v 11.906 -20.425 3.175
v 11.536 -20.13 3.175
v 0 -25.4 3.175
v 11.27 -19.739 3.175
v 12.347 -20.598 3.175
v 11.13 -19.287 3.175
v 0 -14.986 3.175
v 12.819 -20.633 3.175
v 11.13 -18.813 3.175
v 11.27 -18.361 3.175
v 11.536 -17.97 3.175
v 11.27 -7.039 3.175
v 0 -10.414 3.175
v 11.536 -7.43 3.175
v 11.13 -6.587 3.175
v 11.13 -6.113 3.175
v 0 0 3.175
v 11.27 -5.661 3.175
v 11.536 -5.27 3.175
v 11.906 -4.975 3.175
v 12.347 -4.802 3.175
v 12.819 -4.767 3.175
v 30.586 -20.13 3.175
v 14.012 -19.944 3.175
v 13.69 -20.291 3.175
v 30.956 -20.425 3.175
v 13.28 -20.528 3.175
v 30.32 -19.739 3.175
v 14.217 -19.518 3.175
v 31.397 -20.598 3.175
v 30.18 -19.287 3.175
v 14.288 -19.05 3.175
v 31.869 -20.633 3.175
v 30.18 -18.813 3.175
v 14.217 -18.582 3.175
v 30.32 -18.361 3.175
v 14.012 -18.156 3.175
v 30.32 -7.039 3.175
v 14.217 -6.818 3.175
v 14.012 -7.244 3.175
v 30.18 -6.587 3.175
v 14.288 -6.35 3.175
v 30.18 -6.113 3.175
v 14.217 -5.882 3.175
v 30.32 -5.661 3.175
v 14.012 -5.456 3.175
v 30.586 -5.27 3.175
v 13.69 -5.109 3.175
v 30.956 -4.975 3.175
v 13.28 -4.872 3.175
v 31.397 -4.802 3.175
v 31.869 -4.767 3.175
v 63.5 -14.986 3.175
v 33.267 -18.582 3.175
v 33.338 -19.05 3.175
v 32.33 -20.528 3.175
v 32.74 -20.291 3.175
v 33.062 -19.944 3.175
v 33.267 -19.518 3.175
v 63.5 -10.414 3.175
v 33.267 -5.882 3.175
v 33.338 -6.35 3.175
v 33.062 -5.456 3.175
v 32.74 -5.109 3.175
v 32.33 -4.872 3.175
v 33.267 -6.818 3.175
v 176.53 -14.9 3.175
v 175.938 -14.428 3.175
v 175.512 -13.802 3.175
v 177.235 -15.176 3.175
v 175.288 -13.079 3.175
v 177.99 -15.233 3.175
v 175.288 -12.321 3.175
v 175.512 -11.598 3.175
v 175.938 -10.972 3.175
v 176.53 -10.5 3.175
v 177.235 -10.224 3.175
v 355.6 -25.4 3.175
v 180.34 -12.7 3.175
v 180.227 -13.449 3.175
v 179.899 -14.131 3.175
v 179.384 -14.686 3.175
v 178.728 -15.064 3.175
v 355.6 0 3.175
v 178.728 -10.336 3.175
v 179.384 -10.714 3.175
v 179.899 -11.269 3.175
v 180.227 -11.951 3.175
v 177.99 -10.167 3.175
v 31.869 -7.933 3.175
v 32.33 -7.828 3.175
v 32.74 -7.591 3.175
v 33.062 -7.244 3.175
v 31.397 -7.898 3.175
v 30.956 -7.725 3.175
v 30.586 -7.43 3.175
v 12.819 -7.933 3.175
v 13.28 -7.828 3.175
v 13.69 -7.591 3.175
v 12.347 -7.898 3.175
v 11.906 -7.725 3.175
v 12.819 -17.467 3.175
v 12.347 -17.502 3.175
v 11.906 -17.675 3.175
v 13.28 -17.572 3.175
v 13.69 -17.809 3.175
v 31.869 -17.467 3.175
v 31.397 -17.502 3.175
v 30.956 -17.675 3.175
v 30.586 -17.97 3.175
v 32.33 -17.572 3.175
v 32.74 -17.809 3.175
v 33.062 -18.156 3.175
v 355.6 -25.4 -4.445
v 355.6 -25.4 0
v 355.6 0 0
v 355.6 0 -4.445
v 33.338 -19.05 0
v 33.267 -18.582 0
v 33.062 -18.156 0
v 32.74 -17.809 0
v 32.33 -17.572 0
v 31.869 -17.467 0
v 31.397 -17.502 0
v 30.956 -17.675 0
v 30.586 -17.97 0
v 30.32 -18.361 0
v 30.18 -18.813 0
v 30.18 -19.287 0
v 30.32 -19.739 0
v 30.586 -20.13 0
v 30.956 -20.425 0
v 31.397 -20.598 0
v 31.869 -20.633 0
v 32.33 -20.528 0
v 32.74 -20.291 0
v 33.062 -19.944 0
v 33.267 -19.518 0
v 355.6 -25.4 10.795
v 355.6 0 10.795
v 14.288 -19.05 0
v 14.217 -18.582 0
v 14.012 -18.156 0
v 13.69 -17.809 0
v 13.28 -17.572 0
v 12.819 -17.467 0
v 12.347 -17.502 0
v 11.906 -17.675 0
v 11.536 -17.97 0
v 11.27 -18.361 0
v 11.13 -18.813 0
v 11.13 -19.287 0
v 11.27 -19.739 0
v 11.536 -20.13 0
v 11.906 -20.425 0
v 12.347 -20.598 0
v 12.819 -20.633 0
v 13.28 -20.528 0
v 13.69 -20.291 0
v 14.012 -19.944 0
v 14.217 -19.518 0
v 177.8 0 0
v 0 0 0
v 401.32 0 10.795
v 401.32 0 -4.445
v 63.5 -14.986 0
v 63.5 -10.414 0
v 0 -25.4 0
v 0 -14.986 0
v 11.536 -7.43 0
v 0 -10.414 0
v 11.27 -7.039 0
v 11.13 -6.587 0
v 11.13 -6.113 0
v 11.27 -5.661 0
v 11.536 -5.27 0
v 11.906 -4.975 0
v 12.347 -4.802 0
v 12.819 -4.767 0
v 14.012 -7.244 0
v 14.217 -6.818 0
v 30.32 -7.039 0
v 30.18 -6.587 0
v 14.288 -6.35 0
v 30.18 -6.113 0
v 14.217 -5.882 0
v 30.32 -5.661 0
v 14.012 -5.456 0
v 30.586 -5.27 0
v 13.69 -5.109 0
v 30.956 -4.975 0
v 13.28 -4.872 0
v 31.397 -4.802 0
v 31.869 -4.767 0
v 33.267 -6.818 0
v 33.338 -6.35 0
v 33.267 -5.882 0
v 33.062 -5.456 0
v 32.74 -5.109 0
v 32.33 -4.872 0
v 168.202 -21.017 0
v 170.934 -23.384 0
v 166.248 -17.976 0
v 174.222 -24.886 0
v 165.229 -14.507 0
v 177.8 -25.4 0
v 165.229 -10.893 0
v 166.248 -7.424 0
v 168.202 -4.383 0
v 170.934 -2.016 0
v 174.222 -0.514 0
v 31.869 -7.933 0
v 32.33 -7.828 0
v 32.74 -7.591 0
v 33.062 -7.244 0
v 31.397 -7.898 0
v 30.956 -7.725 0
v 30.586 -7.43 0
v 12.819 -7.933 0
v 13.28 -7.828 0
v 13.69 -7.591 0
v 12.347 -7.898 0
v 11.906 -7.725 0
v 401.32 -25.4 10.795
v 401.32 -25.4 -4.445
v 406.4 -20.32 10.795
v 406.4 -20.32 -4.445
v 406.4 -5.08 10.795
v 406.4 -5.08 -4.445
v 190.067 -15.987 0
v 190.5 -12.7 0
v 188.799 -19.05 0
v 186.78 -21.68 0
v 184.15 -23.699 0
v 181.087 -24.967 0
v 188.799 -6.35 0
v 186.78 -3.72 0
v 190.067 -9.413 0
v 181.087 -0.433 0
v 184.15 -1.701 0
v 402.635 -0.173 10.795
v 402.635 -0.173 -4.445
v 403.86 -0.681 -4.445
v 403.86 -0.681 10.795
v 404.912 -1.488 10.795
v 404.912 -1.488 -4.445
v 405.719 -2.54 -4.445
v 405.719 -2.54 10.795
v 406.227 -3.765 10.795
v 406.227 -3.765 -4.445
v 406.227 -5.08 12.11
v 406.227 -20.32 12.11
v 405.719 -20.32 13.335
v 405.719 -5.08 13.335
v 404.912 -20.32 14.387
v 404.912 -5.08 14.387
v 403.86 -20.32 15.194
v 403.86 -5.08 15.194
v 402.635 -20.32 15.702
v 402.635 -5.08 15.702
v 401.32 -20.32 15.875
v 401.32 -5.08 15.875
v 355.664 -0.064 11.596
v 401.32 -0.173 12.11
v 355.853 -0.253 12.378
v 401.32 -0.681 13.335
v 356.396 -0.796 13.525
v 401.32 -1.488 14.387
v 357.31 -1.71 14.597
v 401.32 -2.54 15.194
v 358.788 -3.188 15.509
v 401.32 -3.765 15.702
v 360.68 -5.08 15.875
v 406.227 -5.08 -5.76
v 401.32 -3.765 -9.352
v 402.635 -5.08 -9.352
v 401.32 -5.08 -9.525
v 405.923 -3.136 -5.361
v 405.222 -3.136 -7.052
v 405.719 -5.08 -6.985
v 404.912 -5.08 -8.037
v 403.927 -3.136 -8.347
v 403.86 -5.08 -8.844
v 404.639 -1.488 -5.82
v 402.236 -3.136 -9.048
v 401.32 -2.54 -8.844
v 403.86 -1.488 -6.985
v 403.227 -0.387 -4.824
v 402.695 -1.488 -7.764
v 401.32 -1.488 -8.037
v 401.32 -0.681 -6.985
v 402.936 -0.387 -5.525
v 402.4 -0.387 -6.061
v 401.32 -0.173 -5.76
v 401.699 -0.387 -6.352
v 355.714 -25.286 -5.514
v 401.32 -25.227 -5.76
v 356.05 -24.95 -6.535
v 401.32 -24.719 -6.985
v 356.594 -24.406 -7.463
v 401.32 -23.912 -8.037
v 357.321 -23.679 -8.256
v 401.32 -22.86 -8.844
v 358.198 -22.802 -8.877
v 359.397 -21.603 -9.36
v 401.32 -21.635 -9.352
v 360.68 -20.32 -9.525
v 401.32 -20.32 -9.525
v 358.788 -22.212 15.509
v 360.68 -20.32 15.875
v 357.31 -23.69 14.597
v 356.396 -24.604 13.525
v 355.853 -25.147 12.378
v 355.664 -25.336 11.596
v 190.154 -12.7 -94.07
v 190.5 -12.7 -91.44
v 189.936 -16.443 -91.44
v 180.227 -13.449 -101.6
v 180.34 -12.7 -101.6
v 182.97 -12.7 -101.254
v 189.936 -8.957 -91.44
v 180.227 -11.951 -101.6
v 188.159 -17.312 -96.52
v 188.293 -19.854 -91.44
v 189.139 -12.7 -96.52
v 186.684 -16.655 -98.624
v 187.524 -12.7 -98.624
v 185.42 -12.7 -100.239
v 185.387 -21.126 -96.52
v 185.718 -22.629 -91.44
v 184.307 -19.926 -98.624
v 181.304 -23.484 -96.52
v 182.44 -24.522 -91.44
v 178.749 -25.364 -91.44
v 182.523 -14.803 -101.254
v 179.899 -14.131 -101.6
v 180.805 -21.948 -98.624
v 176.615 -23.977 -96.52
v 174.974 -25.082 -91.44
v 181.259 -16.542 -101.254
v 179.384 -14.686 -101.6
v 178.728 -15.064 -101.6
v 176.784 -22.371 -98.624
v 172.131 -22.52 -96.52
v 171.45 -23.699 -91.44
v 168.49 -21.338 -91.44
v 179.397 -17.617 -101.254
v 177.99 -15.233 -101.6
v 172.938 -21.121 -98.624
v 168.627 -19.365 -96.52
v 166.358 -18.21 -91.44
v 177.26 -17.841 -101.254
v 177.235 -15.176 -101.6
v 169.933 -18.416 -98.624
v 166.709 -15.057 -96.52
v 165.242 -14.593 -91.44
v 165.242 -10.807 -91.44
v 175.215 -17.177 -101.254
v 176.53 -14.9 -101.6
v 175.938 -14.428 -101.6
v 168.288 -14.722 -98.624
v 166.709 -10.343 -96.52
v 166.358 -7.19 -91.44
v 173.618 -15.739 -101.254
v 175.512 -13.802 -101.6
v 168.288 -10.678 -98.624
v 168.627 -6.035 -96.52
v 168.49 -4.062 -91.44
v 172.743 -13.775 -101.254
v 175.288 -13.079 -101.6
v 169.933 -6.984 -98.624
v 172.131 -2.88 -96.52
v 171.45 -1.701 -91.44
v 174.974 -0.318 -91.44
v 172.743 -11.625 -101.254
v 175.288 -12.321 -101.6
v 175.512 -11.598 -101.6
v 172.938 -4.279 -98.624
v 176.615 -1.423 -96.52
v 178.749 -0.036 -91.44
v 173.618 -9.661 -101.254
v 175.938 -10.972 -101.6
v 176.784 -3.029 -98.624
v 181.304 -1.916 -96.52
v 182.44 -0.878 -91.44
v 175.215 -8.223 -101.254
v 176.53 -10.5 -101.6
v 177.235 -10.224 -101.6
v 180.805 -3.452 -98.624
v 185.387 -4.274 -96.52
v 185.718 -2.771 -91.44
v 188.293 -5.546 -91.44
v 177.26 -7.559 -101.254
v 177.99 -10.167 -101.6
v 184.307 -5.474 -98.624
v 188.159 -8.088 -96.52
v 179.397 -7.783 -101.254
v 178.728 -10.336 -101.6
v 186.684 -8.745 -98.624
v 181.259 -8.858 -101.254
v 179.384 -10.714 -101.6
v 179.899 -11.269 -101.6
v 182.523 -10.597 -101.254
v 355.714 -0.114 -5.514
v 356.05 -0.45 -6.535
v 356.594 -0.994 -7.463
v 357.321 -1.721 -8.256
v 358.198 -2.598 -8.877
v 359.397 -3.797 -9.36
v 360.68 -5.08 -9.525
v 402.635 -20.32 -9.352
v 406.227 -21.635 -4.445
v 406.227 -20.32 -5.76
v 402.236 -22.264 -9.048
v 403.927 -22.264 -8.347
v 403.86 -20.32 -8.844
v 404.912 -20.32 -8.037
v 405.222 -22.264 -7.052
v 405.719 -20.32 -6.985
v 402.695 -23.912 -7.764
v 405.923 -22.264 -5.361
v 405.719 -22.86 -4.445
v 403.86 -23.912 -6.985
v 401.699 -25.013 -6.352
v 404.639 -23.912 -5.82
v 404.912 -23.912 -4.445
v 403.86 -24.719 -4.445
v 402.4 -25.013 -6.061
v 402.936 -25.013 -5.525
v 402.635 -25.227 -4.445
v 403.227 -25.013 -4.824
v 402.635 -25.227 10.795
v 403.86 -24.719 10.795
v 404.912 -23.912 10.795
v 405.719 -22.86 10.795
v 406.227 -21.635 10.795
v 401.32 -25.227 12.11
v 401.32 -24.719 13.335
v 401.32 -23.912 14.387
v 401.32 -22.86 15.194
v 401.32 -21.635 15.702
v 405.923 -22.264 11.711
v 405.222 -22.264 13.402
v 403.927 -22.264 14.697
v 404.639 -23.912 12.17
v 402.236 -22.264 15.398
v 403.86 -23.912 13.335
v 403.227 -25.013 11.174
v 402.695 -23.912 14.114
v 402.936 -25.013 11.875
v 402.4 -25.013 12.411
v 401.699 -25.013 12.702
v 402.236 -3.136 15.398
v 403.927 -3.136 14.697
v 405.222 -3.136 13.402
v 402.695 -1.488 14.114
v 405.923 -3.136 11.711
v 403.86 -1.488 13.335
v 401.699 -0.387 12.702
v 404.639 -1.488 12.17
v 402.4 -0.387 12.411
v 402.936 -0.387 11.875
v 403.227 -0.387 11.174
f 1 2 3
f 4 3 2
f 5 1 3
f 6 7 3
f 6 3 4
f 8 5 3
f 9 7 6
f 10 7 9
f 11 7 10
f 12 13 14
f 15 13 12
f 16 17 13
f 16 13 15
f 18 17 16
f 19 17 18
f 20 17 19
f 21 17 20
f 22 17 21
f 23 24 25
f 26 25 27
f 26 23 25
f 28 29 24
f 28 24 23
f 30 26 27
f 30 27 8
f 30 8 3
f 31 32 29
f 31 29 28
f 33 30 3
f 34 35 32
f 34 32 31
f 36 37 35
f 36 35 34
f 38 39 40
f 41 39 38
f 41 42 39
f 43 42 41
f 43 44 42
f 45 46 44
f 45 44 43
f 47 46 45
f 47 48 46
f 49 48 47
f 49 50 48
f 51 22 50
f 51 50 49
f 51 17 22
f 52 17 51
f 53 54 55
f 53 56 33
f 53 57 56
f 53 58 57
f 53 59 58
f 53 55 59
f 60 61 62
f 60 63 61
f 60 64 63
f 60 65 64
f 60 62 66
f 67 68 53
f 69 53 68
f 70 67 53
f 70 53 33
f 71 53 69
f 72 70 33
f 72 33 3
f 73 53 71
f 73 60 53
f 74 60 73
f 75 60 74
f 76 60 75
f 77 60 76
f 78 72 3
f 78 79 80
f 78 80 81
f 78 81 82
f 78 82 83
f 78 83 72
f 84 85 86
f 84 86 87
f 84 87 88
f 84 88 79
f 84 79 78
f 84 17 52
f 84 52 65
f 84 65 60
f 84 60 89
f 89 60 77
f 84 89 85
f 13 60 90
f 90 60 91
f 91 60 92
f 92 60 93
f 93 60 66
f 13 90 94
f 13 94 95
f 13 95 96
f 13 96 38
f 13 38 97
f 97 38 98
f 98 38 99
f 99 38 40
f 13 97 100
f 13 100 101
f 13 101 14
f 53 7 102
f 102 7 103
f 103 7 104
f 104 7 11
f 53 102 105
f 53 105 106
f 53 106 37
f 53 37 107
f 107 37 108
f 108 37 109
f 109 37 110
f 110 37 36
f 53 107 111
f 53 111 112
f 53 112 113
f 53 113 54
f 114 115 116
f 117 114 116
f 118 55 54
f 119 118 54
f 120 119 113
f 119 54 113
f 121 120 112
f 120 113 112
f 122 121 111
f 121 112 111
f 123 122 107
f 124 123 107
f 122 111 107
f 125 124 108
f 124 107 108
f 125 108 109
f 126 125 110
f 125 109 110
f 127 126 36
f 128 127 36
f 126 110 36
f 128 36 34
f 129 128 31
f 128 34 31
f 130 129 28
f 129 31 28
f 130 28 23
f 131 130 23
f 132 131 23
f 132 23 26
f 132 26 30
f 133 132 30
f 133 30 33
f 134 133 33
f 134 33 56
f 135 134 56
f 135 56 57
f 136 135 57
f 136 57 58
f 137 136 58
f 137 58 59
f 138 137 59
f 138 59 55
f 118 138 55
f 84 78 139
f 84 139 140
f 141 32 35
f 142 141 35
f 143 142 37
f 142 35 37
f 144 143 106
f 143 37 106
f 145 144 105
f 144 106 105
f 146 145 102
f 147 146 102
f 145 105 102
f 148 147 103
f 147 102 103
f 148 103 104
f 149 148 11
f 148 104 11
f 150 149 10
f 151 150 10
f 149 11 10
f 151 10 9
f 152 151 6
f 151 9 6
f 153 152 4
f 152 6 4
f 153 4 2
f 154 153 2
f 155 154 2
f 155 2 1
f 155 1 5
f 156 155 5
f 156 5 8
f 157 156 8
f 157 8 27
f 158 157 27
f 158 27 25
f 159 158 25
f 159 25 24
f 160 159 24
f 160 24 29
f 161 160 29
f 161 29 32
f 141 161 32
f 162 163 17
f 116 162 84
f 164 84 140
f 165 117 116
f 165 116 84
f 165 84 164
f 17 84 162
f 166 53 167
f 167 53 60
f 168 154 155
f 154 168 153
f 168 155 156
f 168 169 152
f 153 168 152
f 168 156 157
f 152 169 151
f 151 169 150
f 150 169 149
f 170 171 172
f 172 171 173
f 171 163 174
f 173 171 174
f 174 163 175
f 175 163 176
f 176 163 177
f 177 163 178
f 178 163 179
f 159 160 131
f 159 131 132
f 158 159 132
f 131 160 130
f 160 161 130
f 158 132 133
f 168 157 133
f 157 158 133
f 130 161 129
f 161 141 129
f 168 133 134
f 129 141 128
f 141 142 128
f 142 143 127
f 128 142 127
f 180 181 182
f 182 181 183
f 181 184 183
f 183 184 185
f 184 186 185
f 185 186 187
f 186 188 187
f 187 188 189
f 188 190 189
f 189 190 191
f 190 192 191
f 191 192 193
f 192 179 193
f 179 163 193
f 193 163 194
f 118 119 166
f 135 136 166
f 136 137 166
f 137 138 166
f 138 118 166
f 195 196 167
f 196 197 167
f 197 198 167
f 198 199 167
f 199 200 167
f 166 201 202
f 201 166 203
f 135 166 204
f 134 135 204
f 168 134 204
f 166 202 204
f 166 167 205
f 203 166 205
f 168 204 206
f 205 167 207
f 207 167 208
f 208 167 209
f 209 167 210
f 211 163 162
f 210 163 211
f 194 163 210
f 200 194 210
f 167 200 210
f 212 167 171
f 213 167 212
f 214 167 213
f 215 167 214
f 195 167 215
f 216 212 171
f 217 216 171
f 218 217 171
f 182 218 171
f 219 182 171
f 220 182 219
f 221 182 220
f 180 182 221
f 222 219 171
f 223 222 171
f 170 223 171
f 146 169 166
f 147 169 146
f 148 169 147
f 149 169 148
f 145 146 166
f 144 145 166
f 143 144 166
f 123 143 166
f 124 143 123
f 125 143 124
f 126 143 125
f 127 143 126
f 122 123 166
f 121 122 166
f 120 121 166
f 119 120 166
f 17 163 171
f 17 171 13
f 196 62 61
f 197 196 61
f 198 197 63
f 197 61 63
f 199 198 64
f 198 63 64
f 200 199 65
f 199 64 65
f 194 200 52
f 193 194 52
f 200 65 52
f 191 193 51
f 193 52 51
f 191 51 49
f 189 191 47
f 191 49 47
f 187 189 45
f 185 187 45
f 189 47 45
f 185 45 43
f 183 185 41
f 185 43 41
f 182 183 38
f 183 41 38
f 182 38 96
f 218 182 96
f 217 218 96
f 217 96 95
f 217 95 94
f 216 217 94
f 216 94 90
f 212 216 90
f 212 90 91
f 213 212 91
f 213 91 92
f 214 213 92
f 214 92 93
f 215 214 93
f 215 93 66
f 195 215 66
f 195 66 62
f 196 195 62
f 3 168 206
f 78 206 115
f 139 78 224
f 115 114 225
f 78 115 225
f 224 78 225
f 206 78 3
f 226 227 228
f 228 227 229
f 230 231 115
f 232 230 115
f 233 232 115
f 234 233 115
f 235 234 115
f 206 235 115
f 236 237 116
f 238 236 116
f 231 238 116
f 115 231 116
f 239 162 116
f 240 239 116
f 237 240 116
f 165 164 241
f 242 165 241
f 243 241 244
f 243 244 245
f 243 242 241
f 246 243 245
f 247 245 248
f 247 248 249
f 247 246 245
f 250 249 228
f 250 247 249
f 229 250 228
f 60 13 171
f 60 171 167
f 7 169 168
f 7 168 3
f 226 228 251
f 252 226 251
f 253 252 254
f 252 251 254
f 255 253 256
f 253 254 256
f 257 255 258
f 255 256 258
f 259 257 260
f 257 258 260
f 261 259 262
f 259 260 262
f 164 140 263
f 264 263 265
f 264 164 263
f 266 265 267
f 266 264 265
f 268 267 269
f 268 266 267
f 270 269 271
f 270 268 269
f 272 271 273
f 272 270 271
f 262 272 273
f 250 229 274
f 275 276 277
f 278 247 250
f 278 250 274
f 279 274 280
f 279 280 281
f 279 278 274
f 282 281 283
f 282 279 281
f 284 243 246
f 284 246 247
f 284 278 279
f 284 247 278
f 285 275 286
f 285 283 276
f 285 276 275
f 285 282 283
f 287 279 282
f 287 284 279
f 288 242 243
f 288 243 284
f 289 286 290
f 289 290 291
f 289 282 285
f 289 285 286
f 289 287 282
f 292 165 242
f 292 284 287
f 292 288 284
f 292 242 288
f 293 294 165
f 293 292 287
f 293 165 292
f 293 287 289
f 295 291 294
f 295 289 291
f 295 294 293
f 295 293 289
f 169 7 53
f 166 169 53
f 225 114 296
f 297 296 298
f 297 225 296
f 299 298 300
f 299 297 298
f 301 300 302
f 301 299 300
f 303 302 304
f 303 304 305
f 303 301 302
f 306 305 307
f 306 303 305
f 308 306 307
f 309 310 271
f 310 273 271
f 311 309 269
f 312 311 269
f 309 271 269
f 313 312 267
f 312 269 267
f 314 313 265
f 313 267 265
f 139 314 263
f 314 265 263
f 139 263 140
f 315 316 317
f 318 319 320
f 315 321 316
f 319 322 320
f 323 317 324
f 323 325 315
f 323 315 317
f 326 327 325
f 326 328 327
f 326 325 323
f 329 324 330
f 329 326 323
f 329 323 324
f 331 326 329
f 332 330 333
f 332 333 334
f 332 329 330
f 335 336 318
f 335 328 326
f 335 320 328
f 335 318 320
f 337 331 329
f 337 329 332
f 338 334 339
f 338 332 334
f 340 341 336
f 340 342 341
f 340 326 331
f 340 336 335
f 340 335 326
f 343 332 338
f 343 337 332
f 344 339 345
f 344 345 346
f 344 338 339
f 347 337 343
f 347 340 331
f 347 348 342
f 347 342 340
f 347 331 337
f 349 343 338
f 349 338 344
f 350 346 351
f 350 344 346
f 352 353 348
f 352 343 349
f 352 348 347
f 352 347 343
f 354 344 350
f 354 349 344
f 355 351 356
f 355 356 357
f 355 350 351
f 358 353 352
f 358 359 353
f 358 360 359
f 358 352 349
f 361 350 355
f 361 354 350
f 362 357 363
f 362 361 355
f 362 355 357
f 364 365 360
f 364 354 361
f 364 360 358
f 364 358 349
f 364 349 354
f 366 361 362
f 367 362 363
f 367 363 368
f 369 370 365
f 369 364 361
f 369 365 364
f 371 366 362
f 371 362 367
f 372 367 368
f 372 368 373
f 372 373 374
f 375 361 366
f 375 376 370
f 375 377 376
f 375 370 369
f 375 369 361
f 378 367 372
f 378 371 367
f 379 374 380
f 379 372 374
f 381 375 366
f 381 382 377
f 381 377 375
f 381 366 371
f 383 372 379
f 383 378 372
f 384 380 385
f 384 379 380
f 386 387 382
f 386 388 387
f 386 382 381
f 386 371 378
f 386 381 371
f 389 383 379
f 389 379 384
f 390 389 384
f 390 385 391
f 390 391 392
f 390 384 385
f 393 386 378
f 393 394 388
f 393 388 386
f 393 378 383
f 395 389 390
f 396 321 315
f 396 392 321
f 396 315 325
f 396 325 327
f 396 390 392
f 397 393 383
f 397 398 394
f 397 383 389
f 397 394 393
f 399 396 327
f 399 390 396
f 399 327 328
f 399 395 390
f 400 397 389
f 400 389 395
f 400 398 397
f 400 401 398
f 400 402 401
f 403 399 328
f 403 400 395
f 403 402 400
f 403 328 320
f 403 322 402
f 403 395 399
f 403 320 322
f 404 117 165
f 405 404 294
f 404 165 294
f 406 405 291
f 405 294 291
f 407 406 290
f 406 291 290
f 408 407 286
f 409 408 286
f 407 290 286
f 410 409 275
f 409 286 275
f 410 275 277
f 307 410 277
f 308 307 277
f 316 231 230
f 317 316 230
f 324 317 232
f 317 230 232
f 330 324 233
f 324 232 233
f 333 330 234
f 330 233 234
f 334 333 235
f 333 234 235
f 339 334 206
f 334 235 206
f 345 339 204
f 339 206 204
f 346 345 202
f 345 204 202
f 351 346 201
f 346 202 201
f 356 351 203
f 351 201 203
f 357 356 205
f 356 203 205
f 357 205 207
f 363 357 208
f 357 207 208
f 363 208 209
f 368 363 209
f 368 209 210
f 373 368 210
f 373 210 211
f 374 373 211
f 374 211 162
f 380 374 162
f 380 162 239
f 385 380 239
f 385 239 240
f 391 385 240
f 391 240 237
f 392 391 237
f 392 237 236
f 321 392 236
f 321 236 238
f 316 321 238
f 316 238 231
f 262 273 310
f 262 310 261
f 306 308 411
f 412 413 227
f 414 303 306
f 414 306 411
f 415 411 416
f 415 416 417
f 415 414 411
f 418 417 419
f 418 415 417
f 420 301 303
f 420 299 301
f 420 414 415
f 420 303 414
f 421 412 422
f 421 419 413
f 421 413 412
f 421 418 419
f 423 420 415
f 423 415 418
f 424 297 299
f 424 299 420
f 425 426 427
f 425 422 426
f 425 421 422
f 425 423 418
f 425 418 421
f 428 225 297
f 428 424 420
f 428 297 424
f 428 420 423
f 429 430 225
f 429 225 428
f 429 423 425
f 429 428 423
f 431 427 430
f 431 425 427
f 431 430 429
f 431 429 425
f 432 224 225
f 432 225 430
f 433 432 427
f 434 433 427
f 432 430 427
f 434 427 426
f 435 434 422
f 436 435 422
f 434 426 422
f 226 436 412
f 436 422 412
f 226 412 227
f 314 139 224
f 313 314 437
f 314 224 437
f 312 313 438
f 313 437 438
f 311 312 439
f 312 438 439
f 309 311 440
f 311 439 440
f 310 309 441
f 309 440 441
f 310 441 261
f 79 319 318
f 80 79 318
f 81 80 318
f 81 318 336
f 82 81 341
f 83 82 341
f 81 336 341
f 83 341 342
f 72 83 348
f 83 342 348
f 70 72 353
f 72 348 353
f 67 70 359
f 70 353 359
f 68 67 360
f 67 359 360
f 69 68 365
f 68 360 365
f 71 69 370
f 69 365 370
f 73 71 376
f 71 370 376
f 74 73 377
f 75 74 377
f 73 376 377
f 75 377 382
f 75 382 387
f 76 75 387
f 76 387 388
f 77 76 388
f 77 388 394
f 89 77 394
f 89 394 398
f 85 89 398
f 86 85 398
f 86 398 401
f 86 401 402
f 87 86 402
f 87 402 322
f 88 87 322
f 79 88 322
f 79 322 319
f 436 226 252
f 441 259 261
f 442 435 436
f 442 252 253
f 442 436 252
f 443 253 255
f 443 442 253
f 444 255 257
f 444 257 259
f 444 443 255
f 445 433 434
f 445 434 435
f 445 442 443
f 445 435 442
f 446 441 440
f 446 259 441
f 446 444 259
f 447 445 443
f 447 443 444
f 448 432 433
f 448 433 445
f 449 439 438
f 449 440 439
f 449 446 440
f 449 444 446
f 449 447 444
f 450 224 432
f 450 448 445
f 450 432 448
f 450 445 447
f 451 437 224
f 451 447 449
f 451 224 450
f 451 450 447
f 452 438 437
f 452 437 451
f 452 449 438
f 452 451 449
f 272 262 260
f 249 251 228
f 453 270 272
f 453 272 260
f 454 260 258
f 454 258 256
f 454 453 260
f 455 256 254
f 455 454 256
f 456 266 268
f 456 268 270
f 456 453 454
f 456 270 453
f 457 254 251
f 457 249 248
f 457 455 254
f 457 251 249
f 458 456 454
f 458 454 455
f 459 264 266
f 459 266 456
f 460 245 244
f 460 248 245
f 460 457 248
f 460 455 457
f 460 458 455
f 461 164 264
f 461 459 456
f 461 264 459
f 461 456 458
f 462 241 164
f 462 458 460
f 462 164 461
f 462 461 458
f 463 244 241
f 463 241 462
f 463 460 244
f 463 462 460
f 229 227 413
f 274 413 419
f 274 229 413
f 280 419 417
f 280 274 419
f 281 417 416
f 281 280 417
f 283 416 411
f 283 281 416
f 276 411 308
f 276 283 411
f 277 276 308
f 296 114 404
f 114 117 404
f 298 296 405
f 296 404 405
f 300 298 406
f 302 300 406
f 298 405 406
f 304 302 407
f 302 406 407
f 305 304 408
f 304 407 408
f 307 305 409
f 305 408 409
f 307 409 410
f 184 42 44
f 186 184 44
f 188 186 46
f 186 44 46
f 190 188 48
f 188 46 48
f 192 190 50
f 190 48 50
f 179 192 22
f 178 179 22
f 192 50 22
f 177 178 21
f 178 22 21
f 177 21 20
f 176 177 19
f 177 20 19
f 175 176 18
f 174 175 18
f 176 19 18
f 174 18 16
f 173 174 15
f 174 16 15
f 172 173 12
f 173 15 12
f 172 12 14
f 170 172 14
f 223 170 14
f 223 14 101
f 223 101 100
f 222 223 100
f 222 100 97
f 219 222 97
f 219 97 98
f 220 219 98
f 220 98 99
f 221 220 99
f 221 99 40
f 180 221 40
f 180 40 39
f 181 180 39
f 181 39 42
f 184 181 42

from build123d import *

# Parameters (mm, degrees)
F0_W          = 203.2
F0_H          = 3.175
F1_DEPTH      = 25.4
F2_R          = 1.5875
F3_DEPTH      = 25.4
F4_R          = 12.7
F5_DEPTH      = 101.6
F6_R          = 10.16
F7_R          = 2.54
F8_DEPTH      = 254
F9_W          = 63.5
F9_H          = 4.572
F10_DEPTH     = 25.4
F11_W         = 203.2
F11_H         = 25.4
F12_DEPTH     = 3.175
F13_W         = 50.8
F13_H         = 25.4
F14_DEPTH     = 12.7
F15_DEPTH     = 12.7
F16_R         = 5.08
F17_T1_DEPTH  = 15.24
F17_S5_W      = 5.08
F17_S5_H      = 5.08
F17_T6_DEPTH  = 5.08
F17_S11_W     = 5.08
F17_S11_H     = 5.08
F17_T12_DEPTH = 5.08
F17_S17_W     = 5.08
F17_S17_H     = 5.08
F17_T18_DEPTH = 5.08
F17_S23_W     = 5.08
F17_S23_H     = 5.08
F17_T24_DEPTH = 5.08


# Not quite as in the source:
# - a fillet or chamfer that OpenCascade refuses, or shapes differently, is made with other operations: its cross-section is extruded or revolved along the edge and cut away or added


with BuildPart() as f1:
    # F0 (on Front) → F1 (new body)
    with BuildSketch(Plane.XZ):
        with Locations((101.6, 1.5875)):
            Rectangle(F0_W, F0_H)
    extrude(amount=F1_DEPTH)

    # F2 (on face) → F3 (cut)
    with BuildSketch(Plane.XY.offset(3.175)):
        with Locations((12.7, -19.05)):
            Circle(F2_R)
        with Locations((12.7, -6.35)):
            Circle(F2_R)
        with Locations((31.75, -6.35)):
            Circle(F2_R)
        with Locations((31.75, -19.05)):
            Circle(F2_R)
    extrude(amount=-F3_DEPTH, mode=Mode.SUBTRACT)

    # F4 (on face) → F5 (join)
    with BuildSketch(Plane(origin=(0, 0, 0), x_dir=(1, 0, 0), z_dir=(0, 0, -1))):
        with Locations((177.8, 12.7)):
            Circle(F4_R)
    extrude(amount=F5_DEPTH)

    # F6
    f6_edges = [f1.edges().sort_by_distance(p)[0] for p in [
        (165.1, -12.7, -101.6),
    ]]
    fillet(f6_edges, radius=F6_R)

    # F7 (on face) → F8 (cut)
    with BuildSketch(Plane(origin=(0, 0, -101.6), x_dir=(1, 0, 0), z_dir=(0, 0, -1))):
        with Locations((177.8, 12.7)):
            Circle(F7_R)
    extrude(amount=-F8_DEPTH, mode=Mode.SUBTRACT)

    # F9 (on face) → F10 (cut)
    with BuildSketch(Plane.XY.offset(3.175)):
        with Locations((31.75, -12.7)):
            Rectangle(F9_W, F9_H)
    extrude(amount=-F10_DEPTH, mode=Mode.SUBTRACT)

    # F11 (on face) → F12 (join)
    with BuildSketch(Plane.XY.offset(3.175)):
        with Locations((304.8, -12.7)):
            Rectangle(F11_W, F11_H)
    extrude(amount=-F12_DEPTH)

    # F13 (on face) → F14 (join)
    with BuildSketch(Plane.XY.offset(3.175)):
        with Locations((381, -12.7)):
            Rectangle(F13_W, F13_H)
    extrude(amount=F14_DEPTH)

    # F13 (on face) → F15 (join)
    with BuildSketch(Plane.XY.offset(3.175)):
        with Locations((381, -12.7)):
            Rectangle(F13_W, F13_H)
    extrude(amount=-F15_DEPTH)

    # F16
    f16_edges = [f1.edges().sort_by_distance(p)[0] for p in [
        (406.4, -12.7, 15.875),
        (406.4, -12.7, -9.525),
        (355.6, -12.7, 15.875),
        (355.6, -12.7, -9.525),
        (381, -25.4, 15.875),
        (381, -25.4, -9.525),
        (381, 0, 15.875),
        (381, 0, -9.525),
    ]]
    fillet(f16_edges, radius=F16_R)

    # F17: fillet of radius 5.08 on 2 edges, made by hand

    # F17_s2 → F17_t1 (cut)
    with BuildSketch(Plane.XY.offset(-4.445)):
        with BuildLine():
            ThreePointArc((401.32, 0), (404.9121024484, -1.4878975516), (406.4, -5.08))
            Line((406.4, -5.08), (406.4, 0))
            Line((406.4, 0), (401.32, 0))
        make_face()
        with BuildLine():
            ThreePointArc((401.32, -25.4), (404.9121024484, -23.9121024484), (406.4, -20.32))
            Line((406.4, -20.32), (406.4, -25.4))
            Line((406.4, -25.4), (401.32, -25.4))
        make_face()
    extrude(amount=F17_T1_DEPTH, mode=Mode.SUBTRACT)


with BuildPart() as f17_tool4:
    # F17_s5 → F17_t6 (new body)
    with BuildSketch(Plane.XZ.offset(20.32)):
        with Locations((403.86, 13.335)):
            Rectangle(F17_S5_W, F17_S5_H)
    extrude(amount=F17_T6_DEPTH)

    # F17_s7 → F17_t8 (revolve, cut)
    with BuildSketch(Plane(origin=(401.32, -20.32, 10.795), x_dir=(-0.7071067812, 0, -0.7071067812), z_dir=(-0.7071067812, 0, 0.7071067812))):
        with BuildLine():
            ThreePointArc((0, -5.08), (5.08, 0), (0, 5.08))
            Line((0, 5.08), (0, -5.08))
        make_face()
    revolve(axis=Axis((401.32, -20.32, 10.795), (0, -1, 0)), mode=Mode.SUBTRACT)


with BuildPart() as f1_1:
    add(f1.part)

    # F17_t3: cut F17_tool4
    add(f17_tool4.part, mode=Mode.SUBTRACT)


with BuildPart() as f17_tool10:
    # F17_s11 → F17_t12 (new body)
    with BuildSketch(Plane.XZ.offset(5.08)):
        with Locations((403.86, 13.335)):
            Rectangle(F17_S11_W, F17_S11_H)
    extrude(amount=-F17_T12_DEPTH)

    # F17_s13 → F17_t14 (revolve, cut)
    with BuildSketch(Plane(origin=(401.32, -5.08, 10.795), x_dir=(-0.7071067812, 0, -0.7071067812), z_dir=(0.7071067812, 0, -0.7071067812))):
        with BuildLine():
            ThreePointArc((0, -5.08), (5.08, 0), (0, 5.08))
            Line((0, 5.08), (0, -5.08))
        make_face()
    revolve(axis=Axis((401.32, -5.08, 10.795), (0, 1, 0)), mode=Mode.SUBTRACT)


with BuildPart() as f1_2:
    add(f1_1.part)

    # F17_t9: cut F17_tool10
    add(f17_tool10.part, mode=Mode.SUBTRACT)


with BuildPart() as f17_tool16:
    # F17_s17 → F17_t18 (new body)
    with BuildSketch(Plane.XZ.offset(5.08)):
        with Locations((403.86, -6.985)):
            Rectangle(F17_S17_W, F17_S17_H)
    extrude(amount=-F17_T18_DEPTH)

    # F17_s19 → F17_t20 (revolve, cut)
    with BuildSketch(Plane(origin=(401.32, -5.08, -4.445), x_dir=(-0.7071067812, 0, 0.7071067812), z_dir=(-0.7071067812, 0, -0.7071067812))):
        with BuildLine():
            ThreePointArc((0, -5.08), (5.08, 0), (0, 5.08))
            Line((0, 5.08), (0, -5.08))
        make_face()
    revolve(axis=Axis((401.32, -5.08, -4.445), (0, 1, 0)), mode=Mode.SUBTRACT)


with BuildPart() as f1_3:
    add(f1_2.part)

    # F17_t15: cut F17_tool16
    add(f17_tool16.part, mode=Mode.SUBTRACT)


with BuildPart() as f17_tool22:
    # F17_s23 → F17_t24 (new body)
    with BuildSketch(Plane.XZ.offset(20.32)):
        with Locations((403.86, -6.985)):
            Rectangle(F17_S23_W, F17_S23_H)
    extrude(amount=F17_T24_DEPTH)

    # F17_s25 → F17_t26 (revolve, cut)
    with BuildSketch(Plane(origin=(401.32, -20.32, -4.445), x_dir=(-0.7071067812, 0, 0.7071067812), z_dir=(0.7071067812, 0, 0.7071067812))):
        with BuildLine():
            ThreePointArc((0, -5.08), (5.08, 0), (0, 5.08))
            Line((0, 5.08), (0, -5.08))
        make_face()
    revolve(axis=Axis((401.32, -20.32, -4.445), (0, -1, 0)), mode=Mode.SUBTRACT)


with BuildPart() as f1_4:
    add(f1_3.part)

    # F17_t21: cut F17_tool22
    add(f17_tool22.part, mode=Mode.SUBTRACT)


solid = f1_4.part
